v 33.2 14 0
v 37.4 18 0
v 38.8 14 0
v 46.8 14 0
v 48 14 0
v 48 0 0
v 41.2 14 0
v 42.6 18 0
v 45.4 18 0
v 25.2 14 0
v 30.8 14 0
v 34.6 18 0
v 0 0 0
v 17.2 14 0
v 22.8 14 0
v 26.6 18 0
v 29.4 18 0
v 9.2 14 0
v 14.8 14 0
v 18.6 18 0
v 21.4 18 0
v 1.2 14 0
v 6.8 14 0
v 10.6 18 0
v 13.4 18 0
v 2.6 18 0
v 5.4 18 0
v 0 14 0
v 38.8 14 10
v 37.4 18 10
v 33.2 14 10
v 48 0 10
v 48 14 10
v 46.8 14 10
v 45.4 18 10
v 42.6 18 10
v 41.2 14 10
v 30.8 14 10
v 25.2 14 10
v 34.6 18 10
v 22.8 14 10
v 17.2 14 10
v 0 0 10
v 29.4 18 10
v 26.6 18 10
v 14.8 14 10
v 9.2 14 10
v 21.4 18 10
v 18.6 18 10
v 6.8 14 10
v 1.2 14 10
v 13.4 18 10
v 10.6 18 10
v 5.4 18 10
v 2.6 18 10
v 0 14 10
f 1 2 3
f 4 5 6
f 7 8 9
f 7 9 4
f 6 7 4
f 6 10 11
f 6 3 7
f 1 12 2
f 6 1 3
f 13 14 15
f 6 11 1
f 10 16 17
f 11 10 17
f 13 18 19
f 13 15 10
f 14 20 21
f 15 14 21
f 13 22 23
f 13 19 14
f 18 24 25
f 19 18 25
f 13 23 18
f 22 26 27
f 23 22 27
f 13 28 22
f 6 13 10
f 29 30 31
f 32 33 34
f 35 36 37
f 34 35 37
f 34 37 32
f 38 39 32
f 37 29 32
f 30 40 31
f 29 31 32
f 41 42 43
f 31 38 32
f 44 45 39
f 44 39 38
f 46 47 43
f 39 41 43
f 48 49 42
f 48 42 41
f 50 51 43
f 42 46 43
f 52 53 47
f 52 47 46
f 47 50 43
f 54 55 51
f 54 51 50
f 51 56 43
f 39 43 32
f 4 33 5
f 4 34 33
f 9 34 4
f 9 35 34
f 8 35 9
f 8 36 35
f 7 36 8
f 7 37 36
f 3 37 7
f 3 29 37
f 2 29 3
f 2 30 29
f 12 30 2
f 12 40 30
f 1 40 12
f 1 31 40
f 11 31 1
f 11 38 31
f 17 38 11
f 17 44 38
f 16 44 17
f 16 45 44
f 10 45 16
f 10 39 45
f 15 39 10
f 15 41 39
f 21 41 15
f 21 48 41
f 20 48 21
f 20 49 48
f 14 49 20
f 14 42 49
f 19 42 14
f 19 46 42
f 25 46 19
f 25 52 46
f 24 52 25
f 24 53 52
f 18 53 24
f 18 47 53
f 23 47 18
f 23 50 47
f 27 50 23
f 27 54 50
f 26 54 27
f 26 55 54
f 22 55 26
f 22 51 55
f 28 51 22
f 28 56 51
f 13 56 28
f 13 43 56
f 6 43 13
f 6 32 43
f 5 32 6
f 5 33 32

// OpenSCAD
$fn = 32;

// ----------------------------------------------------------------------
// Gear rack: 6 teeth, pitch 8 mm
// ----------------------------------------------------------------------

// --- parameters (mm) ---
teeth = 6;                // number of teeth
pitch = 8;                // tooth pitch, X
root_w = 5.6;             // tooth width at the root
tip_w = 2.8;              // tooth width at the tip
base_h = 14;              // rack body height, Y
tooth_h = 4;              // tooth height above the body
plate_t = 10;             // rack width, Z (extrusion height)

rack_l = teeth * pitch;  // overall length
total_h = base_h + tooth_h;  // overall height

profile = [[0, 0], [48, 0], [48, 14], [46.8, 14], [45.4, 18], [42.6, 18], [41.2, 14], [38.8, 14], [37.4, 18], [34.6, 18], [33.2, 14], [30.8, 14], [29.4, 18], [26.6, 18], [25.2, 14], [22.8, 14], [21.4, 18], [18.6, 18], [17.2, 14], [14.8, 14], [13.4, 18], [10.6, 18], [9.2, 14], [6.8, 14], [5.4, 18], [2.6, 18], [1.2, 14], [0, 14]];  // primary outline, 28 points, counter clockwise

// --- the one profile operation ---
linear_extrude(height = plate_t) polygon(points = profile);
